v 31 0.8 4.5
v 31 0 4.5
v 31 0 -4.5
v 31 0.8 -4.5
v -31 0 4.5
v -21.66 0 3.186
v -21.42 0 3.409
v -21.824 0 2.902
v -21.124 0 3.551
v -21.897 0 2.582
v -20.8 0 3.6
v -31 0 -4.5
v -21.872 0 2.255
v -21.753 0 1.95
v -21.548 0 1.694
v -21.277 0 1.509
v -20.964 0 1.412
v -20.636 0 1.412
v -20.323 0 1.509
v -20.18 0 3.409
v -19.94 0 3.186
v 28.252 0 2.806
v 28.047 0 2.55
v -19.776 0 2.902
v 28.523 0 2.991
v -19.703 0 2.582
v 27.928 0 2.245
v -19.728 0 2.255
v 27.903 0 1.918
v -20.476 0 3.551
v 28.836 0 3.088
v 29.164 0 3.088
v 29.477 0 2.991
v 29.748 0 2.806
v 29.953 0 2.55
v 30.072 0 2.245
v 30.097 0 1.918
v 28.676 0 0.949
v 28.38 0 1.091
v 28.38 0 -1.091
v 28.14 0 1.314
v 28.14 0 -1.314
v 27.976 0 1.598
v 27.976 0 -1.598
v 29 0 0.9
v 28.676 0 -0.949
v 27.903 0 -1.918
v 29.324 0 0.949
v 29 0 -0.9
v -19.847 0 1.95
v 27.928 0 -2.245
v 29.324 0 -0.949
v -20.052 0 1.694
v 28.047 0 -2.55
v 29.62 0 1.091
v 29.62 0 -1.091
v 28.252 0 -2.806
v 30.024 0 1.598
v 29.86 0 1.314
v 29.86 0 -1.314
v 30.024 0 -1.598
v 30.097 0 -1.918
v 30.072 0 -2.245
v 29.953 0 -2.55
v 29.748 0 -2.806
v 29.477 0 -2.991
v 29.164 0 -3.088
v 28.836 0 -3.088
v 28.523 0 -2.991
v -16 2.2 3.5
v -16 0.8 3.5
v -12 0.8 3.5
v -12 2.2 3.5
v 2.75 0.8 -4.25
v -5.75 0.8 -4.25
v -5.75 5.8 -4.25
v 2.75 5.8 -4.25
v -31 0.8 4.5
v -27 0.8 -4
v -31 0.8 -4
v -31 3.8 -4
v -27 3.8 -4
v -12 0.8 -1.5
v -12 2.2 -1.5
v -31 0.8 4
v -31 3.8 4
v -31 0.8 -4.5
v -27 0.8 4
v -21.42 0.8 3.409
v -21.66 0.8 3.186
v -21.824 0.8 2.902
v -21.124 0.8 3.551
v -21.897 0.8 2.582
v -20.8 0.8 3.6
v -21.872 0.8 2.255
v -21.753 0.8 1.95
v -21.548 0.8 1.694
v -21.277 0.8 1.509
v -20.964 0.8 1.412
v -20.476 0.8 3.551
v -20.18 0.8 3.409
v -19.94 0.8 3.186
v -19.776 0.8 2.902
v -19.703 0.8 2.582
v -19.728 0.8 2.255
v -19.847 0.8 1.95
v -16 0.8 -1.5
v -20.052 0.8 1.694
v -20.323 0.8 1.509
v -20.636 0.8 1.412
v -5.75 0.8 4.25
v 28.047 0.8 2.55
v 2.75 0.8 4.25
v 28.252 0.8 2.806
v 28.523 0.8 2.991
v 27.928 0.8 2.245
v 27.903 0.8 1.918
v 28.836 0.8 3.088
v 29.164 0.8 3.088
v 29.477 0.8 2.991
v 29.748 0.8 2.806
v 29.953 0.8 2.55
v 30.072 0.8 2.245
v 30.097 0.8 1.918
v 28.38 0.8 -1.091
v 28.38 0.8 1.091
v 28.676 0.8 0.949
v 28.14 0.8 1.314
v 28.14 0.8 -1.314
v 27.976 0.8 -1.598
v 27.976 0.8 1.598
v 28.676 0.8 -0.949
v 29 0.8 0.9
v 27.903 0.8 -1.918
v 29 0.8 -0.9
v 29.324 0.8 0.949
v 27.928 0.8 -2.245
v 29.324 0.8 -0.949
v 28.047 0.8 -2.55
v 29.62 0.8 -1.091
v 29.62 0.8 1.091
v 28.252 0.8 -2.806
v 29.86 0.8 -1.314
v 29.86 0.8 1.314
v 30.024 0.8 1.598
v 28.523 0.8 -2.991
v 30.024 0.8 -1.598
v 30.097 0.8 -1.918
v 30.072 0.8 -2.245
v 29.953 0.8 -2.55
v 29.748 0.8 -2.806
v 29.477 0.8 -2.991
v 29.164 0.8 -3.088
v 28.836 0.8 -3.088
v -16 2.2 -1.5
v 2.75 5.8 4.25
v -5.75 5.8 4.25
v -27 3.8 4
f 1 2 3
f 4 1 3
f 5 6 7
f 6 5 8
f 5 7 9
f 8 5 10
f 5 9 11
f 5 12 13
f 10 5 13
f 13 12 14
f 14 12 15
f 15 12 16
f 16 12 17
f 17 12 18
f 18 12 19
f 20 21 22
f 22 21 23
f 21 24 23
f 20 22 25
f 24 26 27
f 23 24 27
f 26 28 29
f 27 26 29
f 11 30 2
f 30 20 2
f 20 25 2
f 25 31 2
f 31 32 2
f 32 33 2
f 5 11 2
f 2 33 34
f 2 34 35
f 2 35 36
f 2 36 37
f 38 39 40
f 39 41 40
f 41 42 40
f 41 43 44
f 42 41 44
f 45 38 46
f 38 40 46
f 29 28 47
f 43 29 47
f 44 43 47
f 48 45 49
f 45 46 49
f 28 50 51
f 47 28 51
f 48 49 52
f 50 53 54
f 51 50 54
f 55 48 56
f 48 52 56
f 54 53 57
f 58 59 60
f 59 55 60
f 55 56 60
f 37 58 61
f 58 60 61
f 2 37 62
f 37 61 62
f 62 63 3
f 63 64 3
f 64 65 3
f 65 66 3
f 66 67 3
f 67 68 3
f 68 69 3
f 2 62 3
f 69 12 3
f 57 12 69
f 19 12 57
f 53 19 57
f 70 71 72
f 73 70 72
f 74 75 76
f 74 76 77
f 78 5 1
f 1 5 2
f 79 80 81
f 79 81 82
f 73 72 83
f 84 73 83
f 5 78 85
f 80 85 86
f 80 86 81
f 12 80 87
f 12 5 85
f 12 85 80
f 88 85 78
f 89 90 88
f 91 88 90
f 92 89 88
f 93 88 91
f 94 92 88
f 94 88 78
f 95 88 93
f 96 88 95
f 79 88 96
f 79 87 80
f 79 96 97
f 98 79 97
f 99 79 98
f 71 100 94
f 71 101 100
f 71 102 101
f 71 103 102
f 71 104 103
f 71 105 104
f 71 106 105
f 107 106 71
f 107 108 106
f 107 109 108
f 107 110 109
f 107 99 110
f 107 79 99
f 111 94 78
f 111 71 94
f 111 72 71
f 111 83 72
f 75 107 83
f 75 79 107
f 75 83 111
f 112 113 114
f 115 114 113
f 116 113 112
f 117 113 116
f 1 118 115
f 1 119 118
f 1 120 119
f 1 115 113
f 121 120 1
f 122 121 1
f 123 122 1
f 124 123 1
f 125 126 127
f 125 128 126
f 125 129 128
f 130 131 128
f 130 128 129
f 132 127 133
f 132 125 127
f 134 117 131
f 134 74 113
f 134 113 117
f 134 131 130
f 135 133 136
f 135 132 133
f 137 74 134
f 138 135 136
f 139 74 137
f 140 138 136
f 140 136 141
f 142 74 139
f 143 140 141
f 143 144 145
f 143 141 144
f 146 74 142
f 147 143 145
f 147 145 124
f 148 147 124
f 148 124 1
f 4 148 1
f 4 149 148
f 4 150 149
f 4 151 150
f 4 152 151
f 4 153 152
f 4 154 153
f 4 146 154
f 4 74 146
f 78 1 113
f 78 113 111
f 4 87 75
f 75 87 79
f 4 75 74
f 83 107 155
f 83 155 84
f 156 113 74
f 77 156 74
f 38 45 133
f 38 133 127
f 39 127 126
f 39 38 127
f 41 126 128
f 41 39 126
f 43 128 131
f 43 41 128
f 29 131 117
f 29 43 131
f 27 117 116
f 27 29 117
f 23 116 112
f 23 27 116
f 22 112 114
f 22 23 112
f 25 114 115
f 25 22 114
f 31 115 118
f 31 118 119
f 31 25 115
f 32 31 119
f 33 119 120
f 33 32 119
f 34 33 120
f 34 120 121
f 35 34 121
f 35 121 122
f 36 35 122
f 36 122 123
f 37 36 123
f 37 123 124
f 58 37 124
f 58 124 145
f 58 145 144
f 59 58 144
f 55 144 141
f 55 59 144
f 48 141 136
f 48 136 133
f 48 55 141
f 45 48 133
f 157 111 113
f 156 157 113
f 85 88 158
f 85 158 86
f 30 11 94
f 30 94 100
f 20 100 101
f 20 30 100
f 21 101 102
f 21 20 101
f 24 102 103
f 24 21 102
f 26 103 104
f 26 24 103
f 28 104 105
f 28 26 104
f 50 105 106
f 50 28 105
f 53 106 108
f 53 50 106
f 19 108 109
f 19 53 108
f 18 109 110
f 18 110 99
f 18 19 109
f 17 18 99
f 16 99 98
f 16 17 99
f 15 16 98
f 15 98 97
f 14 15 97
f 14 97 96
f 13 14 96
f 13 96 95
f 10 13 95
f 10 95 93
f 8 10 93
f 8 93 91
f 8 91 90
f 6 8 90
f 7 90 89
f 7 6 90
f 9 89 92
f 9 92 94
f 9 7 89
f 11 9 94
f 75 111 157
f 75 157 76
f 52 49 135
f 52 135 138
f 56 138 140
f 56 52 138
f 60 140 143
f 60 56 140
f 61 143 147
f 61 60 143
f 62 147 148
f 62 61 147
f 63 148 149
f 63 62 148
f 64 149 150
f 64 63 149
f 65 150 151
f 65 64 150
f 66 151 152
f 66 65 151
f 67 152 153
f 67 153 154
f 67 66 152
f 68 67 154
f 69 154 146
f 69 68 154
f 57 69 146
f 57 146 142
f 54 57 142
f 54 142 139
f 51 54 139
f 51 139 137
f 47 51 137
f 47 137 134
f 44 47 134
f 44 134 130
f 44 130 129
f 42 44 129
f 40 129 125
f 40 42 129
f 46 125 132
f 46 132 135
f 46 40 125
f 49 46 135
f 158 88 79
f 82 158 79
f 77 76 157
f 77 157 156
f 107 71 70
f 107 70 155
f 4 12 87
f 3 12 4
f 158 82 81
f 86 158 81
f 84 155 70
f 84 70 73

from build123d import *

# Parameters (mm, degrees)
SKETCH_1_W      = 62
SKETCH_1_H      = 9
SKETCH_1_R      = 1.1
EXTRUDE_1_DEPTH = 0.8
SKETCH_3_W      = 8.5
SKETCH_3_H      = 8.5
EXTRUDE_2_DEPTH = 5
EXTRUDE_3_DEPTH = 3
SKETCH_5_W      = 4
SKETCH_5_H      = 5
EXTRUDE_4_DEPTH = 1.4


with BuildPart() as part:
    # 草图1 → 凸台-拉伸1 (new body)
    with BuildSketch(Plane(origin=(0, 0, 0), x_dir=(1, 0, 0), z_dir=(0, 1, 0))):
        Rectangle(SKETCH_1_W, SKETCH_1_H)
        with Locations(Location((29, 2, 0), (0, 0, 270))):
            Circle(SKETCH_1_R, mode=Mode.SUBTRACT)
        with Locations(Location((29, -2, 0), (0, 0, 90))):
            Circle(SKETCH_1_R, mode=Mode.SUBTRACT)
        with Locations(Location((-20.8, -2.5, 0), (0, 0, 270))):
            Circle(SKETCH_1_R, mode=Mode.SUBTRACT)
    extrude(amount=EXTRUDE_1_DEPTH)

    # 草图3 → 凸台-拉伸2 (add)
    with BuildSketch(Plane(origin=(0, 0.8, 0), x_dir=(1, 0, 0), z_dir=(0, 1, 0))):
        with Locations((-1.5, 0)):
            Rectangle(SKETCH_3_W, SKETCH_3_H)
    extrude(amount=EXTRUDE_2_DEPTH)

    # 草图4 → 凸台-拉伸3 (add)
    with BuildSketch(Plane(origin=(0, 0.8, 0), x_dir=(1, 0, 0), z_dir=(0, 1, 0))):
        Polygon((-31, 0), (-31, 4), (-27, 4), (-27, -1.222216668), (-27, -4), (-31, -4), align=None)
    extrude(amount=EXTRUDE_3_DEPTH)

    # 草图5 → 凸台-拉伸4 (add)
    with BuildSketch(Plane(origin=(0, 0.8, 0), x_dir=(1, 0, 0), z_dir=(0, 1, 0))):
        with Locations((-14, -1)):
            Rectangle(SKETCH_5_W, SKETCH_5_H)
    extrude(amount=EXTRUDE_4_DEPTH)


solid = part.part
